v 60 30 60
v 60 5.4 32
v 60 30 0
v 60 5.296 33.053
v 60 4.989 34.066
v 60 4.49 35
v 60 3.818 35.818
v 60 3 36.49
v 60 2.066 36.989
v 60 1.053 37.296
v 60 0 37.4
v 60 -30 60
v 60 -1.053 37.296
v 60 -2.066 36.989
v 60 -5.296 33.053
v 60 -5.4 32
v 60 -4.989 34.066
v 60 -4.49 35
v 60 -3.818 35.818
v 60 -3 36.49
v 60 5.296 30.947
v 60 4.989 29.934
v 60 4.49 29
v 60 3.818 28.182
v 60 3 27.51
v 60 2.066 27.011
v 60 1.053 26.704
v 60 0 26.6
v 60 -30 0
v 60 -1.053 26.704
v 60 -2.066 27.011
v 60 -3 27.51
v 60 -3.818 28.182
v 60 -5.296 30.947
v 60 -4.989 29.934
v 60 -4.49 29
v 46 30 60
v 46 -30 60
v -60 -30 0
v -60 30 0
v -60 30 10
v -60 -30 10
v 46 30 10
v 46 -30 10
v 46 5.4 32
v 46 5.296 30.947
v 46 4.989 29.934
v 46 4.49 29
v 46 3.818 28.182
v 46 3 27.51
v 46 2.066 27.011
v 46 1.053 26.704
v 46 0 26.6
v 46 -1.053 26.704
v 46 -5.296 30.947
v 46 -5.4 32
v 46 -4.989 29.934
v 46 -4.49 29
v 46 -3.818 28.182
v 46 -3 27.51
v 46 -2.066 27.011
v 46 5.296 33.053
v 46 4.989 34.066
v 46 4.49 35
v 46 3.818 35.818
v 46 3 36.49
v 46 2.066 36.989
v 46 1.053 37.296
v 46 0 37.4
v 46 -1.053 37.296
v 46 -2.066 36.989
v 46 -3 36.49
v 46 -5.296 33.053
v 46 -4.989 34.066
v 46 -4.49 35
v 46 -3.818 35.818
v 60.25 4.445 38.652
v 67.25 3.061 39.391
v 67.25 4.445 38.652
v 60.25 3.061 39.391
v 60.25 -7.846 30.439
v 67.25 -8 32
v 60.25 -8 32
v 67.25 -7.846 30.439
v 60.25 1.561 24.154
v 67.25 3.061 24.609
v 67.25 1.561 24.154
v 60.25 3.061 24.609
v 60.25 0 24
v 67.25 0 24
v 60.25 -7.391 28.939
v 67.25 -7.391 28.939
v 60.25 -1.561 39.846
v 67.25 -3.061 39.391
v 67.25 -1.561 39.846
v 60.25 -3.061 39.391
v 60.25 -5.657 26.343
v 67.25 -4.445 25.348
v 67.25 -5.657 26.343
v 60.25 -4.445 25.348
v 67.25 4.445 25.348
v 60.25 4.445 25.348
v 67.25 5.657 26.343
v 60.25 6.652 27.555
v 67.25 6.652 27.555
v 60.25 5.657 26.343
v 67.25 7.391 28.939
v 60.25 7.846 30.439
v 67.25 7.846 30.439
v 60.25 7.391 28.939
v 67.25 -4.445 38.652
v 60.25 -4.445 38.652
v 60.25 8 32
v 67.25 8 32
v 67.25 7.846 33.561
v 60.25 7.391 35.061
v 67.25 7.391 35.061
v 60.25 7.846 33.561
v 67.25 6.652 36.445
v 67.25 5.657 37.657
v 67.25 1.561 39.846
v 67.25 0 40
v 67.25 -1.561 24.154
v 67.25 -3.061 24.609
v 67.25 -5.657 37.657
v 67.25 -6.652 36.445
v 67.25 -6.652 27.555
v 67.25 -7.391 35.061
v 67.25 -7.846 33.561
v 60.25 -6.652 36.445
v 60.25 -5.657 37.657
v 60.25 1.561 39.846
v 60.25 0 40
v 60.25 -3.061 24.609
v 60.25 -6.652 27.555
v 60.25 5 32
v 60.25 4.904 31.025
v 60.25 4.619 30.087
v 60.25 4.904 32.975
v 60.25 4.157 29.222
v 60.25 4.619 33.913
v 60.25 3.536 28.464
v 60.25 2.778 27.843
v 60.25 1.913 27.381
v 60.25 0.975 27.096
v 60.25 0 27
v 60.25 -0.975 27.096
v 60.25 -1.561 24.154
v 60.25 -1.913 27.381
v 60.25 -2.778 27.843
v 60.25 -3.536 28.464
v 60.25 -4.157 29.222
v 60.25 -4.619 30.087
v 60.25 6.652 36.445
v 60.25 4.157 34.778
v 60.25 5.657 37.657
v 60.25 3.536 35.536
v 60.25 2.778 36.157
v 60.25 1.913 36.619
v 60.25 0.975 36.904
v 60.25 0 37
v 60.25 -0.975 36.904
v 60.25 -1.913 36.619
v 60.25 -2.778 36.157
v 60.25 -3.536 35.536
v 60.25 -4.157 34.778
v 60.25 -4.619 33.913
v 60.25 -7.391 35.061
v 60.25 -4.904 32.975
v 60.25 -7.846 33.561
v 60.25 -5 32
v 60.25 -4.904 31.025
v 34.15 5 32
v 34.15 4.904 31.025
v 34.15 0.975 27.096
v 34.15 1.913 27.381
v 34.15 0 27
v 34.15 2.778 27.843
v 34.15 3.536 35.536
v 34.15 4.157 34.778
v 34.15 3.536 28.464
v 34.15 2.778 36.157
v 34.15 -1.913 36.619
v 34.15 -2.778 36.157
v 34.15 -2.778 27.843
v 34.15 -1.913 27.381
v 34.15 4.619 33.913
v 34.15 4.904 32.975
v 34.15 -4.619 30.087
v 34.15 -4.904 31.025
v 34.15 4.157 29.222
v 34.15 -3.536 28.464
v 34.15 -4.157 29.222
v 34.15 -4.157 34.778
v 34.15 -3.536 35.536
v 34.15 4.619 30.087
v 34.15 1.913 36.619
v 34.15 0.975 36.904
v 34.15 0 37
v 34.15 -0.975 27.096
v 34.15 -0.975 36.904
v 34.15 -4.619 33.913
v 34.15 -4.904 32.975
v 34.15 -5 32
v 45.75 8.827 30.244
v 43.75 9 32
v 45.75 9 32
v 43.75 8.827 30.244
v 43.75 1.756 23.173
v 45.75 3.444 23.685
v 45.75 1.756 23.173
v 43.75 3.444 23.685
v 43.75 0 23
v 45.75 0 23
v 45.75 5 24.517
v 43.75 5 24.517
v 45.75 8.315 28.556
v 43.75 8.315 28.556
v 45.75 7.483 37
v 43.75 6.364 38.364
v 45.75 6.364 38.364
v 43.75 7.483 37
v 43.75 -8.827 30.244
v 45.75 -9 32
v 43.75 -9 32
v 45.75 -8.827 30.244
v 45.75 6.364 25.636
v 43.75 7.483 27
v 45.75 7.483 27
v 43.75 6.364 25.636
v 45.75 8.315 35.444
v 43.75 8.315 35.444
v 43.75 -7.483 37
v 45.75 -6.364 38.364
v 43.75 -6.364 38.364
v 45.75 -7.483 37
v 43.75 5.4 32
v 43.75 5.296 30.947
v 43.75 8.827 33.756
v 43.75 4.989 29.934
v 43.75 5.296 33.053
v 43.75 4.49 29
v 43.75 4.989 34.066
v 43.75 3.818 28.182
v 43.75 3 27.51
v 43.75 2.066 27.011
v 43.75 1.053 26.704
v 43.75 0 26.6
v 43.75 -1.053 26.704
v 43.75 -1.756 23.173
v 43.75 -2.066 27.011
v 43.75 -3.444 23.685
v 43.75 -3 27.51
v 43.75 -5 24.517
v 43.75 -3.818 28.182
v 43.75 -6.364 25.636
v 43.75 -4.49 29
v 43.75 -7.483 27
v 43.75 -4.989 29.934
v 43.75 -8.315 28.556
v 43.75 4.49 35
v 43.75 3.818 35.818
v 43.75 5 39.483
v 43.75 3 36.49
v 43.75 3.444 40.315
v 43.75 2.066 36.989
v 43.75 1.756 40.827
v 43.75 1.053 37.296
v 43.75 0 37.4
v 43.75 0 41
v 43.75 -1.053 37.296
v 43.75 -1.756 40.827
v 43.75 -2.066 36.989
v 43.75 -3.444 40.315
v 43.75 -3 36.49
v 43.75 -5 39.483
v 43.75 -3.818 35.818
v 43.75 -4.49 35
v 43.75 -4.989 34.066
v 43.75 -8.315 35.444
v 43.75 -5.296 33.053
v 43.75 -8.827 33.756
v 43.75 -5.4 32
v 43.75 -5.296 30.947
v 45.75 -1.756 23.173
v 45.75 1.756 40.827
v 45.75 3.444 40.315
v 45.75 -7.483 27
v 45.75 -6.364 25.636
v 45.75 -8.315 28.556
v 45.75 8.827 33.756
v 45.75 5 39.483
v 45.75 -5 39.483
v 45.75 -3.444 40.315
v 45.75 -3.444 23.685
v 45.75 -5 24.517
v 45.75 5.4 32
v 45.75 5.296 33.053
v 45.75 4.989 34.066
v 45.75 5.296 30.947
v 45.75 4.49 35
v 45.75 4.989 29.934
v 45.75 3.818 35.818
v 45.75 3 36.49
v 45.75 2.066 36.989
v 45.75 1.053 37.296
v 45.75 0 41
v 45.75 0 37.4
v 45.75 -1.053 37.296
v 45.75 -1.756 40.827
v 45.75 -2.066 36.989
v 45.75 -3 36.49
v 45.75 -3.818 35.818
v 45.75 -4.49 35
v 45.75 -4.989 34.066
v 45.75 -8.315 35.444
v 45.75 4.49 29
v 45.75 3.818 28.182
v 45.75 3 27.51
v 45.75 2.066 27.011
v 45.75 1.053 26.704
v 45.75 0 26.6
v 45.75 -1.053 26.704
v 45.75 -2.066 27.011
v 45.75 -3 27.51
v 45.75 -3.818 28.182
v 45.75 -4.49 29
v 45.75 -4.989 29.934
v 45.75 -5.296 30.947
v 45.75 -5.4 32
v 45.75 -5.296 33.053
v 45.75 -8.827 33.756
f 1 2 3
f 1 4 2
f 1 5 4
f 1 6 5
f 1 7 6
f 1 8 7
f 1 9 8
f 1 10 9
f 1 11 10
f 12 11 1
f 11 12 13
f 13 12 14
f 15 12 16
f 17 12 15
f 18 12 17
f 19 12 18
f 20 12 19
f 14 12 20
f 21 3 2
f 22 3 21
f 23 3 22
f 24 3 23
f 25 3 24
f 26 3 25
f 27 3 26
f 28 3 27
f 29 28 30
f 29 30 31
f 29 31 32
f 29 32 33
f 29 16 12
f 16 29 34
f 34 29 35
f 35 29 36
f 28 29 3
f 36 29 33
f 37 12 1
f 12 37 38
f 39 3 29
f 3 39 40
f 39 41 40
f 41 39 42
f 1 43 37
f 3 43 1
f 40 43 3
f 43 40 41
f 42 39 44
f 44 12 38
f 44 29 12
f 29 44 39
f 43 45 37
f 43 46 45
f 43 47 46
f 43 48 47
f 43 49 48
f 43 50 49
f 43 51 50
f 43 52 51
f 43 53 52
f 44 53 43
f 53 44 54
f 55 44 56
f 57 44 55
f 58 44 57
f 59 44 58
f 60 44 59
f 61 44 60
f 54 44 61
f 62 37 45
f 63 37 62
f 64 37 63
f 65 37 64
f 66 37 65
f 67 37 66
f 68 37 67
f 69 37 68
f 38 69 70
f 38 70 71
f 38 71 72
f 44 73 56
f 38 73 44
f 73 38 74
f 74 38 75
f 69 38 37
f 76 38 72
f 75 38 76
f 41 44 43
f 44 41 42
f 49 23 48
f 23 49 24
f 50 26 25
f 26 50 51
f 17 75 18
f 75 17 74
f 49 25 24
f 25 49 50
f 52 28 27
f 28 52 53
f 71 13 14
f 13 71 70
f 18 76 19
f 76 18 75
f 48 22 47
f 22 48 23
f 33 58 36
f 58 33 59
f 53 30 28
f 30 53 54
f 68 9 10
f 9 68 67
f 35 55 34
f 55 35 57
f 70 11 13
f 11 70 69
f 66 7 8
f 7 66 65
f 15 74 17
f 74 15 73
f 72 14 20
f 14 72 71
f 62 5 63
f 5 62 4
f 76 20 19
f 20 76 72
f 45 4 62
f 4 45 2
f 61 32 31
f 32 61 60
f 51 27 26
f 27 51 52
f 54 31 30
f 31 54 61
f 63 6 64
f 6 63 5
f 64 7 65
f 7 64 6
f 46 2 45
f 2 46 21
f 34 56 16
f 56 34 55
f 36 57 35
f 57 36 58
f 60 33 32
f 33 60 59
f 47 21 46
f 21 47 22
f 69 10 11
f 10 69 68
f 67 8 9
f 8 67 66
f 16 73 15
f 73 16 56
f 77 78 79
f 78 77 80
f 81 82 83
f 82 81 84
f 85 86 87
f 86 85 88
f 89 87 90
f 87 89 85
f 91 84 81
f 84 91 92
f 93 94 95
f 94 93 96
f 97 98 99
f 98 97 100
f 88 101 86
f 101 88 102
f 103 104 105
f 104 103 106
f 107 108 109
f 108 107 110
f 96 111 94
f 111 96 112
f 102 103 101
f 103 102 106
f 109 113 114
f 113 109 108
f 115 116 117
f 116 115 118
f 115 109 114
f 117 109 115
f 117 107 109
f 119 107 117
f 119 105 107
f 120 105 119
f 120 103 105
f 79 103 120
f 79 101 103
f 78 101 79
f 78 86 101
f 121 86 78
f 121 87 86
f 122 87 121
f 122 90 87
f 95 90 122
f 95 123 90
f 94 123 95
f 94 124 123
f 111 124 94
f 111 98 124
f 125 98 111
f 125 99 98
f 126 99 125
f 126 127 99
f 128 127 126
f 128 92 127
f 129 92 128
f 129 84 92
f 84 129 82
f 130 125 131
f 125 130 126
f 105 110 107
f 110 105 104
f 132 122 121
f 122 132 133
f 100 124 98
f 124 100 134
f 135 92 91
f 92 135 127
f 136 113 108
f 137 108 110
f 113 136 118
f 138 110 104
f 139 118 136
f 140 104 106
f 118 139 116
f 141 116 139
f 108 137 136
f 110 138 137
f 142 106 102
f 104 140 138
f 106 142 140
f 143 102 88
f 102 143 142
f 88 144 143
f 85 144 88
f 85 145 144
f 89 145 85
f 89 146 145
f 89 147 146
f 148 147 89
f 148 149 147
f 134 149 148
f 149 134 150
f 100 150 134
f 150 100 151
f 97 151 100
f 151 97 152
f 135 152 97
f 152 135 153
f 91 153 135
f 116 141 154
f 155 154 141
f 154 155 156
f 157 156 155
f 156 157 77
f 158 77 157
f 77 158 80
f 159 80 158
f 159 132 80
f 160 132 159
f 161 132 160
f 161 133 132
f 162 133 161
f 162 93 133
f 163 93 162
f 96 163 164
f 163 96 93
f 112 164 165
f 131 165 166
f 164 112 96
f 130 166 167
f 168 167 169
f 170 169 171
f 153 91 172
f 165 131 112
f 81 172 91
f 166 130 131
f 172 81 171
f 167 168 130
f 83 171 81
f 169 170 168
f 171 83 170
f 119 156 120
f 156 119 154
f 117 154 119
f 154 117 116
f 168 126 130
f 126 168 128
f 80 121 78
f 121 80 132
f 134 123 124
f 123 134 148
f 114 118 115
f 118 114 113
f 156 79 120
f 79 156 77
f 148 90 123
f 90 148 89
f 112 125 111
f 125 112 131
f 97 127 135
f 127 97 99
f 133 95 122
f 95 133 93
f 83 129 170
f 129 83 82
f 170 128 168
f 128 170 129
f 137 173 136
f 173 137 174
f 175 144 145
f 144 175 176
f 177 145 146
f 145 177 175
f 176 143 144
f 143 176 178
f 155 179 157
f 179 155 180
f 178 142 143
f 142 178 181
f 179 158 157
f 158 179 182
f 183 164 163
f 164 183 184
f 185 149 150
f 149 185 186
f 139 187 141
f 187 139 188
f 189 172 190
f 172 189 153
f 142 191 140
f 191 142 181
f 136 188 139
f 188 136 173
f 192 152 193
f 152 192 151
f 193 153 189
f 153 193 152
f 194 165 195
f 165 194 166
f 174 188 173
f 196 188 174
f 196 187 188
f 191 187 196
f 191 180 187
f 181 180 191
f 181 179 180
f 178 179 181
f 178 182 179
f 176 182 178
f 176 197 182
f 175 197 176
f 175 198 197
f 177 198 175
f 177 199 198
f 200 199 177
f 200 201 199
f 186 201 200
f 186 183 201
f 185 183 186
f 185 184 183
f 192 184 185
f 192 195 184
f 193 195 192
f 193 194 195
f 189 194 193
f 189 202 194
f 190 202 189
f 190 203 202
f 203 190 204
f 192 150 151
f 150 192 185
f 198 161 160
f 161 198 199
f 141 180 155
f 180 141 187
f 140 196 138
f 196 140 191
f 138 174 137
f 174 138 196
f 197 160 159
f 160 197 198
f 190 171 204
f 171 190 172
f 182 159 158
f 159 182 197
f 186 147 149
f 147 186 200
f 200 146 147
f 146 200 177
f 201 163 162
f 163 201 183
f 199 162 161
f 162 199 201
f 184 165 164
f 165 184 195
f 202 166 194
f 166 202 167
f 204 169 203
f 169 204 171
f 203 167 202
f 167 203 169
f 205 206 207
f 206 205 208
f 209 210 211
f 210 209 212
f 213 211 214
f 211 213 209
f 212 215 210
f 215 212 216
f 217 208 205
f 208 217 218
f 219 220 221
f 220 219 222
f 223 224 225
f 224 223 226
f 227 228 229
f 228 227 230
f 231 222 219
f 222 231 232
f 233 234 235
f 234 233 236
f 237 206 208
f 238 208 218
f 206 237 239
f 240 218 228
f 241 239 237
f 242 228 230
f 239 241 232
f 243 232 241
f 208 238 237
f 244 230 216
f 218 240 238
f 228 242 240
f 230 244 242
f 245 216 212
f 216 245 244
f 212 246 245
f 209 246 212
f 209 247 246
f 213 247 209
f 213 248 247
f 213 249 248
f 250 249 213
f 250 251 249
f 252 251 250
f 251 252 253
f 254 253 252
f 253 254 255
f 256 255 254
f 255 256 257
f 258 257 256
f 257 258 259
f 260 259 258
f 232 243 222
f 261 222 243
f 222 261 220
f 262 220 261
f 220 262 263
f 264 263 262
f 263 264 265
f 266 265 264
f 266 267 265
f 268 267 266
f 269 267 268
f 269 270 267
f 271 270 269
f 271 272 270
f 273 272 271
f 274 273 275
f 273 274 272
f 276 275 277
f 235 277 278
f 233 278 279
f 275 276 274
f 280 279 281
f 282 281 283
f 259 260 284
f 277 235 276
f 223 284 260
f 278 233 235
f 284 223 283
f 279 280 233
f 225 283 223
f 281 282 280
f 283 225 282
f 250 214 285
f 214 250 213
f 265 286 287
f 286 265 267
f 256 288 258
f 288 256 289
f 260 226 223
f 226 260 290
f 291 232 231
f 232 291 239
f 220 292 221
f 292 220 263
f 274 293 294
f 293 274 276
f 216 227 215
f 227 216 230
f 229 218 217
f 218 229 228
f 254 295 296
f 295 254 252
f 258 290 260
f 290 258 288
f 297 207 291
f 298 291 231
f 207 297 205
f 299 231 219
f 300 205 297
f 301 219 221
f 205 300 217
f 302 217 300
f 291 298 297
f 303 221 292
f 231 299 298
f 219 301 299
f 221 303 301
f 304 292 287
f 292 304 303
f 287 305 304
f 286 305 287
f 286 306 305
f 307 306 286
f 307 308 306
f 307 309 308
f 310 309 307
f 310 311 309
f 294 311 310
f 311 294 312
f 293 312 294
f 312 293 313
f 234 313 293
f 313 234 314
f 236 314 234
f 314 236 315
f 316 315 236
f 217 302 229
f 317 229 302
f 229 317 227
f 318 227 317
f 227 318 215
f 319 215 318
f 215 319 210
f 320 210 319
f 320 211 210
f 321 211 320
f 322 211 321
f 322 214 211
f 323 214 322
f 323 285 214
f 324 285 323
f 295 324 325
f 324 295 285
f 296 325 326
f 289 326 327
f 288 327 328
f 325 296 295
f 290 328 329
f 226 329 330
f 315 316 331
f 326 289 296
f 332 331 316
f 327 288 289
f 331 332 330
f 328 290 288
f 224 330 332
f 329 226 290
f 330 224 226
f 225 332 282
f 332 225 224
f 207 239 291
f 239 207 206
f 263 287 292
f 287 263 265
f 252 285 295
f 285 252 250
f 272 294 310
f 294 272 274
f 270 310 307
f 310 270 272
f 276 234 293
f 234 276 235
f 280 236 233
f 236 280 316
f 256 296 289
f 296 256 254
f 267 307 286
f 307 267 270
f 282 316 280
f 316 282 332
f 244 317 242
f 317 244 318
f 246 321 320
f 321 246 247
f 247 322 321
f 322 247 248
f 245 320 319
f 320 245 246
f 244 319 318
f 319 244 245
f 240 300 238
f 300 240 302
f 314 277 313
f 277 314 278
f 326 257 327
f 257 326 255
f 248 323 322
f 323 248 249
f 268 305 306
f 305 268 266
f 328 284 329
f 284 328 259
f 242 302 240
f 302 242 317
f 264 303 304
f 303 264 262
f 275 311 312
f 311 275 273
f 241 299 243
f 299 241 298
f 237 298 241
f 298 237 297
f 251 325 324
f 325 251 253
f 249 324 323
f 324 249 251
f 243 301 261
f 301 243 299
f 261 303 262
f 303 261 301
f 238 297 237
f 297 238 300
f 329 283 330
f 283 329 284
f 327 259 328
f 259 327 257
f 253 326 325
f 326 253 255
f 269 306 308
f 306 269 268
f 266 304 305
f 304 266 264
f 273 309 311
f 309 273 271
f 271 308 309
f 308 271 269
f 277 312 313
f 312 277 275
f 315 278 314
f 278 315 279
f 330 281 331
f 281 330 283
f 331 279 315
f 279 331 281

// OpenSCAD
$fn = 32;

// ------------------------------------------------------------------------
// Bolted bracket: 120 x 60 mm bracket with 1 bolt joints
// Every part is its own module, assembly() places them once.
// ------------------------------------------------------------------------

// --- part 1 ---
module bracket() {
  difference() {
    translate([-60, -30, 0]) cube([120, 60, 60]);
    translate([-61, -31, 10]) cube([107, 62, 51]);
    translate([53, 0, 32]) rotate([0, 90, 0]) cylinder(h = 16, d = 10.8, center = true);
  }
}

// --- part 2 ---
module bolt() {
  cylinder(h = 7, d = 16);
  translate([0, 0, -26.1]) cylinder(h = 26.1, d = 10);
}

// --- part 3 ---
module washer() {
  difference() {
      translate([0, 0, 0]) cylinder(h = 2, d = 18);
      translate([0, 0, -1]) cylinder(h = 4, d = 10.8);
    }
}

// --- assembly ---
module assembly() {
  translate([0, 0, 0]) rotate([0, 0, 0]) bracket();
  translate([60.25, 0, 32]) rotate([0, 90, 0]) bolt();
  translate([43.75, 0, 32]) rotate([0, 90, 0]) washer();
}

assembly();
